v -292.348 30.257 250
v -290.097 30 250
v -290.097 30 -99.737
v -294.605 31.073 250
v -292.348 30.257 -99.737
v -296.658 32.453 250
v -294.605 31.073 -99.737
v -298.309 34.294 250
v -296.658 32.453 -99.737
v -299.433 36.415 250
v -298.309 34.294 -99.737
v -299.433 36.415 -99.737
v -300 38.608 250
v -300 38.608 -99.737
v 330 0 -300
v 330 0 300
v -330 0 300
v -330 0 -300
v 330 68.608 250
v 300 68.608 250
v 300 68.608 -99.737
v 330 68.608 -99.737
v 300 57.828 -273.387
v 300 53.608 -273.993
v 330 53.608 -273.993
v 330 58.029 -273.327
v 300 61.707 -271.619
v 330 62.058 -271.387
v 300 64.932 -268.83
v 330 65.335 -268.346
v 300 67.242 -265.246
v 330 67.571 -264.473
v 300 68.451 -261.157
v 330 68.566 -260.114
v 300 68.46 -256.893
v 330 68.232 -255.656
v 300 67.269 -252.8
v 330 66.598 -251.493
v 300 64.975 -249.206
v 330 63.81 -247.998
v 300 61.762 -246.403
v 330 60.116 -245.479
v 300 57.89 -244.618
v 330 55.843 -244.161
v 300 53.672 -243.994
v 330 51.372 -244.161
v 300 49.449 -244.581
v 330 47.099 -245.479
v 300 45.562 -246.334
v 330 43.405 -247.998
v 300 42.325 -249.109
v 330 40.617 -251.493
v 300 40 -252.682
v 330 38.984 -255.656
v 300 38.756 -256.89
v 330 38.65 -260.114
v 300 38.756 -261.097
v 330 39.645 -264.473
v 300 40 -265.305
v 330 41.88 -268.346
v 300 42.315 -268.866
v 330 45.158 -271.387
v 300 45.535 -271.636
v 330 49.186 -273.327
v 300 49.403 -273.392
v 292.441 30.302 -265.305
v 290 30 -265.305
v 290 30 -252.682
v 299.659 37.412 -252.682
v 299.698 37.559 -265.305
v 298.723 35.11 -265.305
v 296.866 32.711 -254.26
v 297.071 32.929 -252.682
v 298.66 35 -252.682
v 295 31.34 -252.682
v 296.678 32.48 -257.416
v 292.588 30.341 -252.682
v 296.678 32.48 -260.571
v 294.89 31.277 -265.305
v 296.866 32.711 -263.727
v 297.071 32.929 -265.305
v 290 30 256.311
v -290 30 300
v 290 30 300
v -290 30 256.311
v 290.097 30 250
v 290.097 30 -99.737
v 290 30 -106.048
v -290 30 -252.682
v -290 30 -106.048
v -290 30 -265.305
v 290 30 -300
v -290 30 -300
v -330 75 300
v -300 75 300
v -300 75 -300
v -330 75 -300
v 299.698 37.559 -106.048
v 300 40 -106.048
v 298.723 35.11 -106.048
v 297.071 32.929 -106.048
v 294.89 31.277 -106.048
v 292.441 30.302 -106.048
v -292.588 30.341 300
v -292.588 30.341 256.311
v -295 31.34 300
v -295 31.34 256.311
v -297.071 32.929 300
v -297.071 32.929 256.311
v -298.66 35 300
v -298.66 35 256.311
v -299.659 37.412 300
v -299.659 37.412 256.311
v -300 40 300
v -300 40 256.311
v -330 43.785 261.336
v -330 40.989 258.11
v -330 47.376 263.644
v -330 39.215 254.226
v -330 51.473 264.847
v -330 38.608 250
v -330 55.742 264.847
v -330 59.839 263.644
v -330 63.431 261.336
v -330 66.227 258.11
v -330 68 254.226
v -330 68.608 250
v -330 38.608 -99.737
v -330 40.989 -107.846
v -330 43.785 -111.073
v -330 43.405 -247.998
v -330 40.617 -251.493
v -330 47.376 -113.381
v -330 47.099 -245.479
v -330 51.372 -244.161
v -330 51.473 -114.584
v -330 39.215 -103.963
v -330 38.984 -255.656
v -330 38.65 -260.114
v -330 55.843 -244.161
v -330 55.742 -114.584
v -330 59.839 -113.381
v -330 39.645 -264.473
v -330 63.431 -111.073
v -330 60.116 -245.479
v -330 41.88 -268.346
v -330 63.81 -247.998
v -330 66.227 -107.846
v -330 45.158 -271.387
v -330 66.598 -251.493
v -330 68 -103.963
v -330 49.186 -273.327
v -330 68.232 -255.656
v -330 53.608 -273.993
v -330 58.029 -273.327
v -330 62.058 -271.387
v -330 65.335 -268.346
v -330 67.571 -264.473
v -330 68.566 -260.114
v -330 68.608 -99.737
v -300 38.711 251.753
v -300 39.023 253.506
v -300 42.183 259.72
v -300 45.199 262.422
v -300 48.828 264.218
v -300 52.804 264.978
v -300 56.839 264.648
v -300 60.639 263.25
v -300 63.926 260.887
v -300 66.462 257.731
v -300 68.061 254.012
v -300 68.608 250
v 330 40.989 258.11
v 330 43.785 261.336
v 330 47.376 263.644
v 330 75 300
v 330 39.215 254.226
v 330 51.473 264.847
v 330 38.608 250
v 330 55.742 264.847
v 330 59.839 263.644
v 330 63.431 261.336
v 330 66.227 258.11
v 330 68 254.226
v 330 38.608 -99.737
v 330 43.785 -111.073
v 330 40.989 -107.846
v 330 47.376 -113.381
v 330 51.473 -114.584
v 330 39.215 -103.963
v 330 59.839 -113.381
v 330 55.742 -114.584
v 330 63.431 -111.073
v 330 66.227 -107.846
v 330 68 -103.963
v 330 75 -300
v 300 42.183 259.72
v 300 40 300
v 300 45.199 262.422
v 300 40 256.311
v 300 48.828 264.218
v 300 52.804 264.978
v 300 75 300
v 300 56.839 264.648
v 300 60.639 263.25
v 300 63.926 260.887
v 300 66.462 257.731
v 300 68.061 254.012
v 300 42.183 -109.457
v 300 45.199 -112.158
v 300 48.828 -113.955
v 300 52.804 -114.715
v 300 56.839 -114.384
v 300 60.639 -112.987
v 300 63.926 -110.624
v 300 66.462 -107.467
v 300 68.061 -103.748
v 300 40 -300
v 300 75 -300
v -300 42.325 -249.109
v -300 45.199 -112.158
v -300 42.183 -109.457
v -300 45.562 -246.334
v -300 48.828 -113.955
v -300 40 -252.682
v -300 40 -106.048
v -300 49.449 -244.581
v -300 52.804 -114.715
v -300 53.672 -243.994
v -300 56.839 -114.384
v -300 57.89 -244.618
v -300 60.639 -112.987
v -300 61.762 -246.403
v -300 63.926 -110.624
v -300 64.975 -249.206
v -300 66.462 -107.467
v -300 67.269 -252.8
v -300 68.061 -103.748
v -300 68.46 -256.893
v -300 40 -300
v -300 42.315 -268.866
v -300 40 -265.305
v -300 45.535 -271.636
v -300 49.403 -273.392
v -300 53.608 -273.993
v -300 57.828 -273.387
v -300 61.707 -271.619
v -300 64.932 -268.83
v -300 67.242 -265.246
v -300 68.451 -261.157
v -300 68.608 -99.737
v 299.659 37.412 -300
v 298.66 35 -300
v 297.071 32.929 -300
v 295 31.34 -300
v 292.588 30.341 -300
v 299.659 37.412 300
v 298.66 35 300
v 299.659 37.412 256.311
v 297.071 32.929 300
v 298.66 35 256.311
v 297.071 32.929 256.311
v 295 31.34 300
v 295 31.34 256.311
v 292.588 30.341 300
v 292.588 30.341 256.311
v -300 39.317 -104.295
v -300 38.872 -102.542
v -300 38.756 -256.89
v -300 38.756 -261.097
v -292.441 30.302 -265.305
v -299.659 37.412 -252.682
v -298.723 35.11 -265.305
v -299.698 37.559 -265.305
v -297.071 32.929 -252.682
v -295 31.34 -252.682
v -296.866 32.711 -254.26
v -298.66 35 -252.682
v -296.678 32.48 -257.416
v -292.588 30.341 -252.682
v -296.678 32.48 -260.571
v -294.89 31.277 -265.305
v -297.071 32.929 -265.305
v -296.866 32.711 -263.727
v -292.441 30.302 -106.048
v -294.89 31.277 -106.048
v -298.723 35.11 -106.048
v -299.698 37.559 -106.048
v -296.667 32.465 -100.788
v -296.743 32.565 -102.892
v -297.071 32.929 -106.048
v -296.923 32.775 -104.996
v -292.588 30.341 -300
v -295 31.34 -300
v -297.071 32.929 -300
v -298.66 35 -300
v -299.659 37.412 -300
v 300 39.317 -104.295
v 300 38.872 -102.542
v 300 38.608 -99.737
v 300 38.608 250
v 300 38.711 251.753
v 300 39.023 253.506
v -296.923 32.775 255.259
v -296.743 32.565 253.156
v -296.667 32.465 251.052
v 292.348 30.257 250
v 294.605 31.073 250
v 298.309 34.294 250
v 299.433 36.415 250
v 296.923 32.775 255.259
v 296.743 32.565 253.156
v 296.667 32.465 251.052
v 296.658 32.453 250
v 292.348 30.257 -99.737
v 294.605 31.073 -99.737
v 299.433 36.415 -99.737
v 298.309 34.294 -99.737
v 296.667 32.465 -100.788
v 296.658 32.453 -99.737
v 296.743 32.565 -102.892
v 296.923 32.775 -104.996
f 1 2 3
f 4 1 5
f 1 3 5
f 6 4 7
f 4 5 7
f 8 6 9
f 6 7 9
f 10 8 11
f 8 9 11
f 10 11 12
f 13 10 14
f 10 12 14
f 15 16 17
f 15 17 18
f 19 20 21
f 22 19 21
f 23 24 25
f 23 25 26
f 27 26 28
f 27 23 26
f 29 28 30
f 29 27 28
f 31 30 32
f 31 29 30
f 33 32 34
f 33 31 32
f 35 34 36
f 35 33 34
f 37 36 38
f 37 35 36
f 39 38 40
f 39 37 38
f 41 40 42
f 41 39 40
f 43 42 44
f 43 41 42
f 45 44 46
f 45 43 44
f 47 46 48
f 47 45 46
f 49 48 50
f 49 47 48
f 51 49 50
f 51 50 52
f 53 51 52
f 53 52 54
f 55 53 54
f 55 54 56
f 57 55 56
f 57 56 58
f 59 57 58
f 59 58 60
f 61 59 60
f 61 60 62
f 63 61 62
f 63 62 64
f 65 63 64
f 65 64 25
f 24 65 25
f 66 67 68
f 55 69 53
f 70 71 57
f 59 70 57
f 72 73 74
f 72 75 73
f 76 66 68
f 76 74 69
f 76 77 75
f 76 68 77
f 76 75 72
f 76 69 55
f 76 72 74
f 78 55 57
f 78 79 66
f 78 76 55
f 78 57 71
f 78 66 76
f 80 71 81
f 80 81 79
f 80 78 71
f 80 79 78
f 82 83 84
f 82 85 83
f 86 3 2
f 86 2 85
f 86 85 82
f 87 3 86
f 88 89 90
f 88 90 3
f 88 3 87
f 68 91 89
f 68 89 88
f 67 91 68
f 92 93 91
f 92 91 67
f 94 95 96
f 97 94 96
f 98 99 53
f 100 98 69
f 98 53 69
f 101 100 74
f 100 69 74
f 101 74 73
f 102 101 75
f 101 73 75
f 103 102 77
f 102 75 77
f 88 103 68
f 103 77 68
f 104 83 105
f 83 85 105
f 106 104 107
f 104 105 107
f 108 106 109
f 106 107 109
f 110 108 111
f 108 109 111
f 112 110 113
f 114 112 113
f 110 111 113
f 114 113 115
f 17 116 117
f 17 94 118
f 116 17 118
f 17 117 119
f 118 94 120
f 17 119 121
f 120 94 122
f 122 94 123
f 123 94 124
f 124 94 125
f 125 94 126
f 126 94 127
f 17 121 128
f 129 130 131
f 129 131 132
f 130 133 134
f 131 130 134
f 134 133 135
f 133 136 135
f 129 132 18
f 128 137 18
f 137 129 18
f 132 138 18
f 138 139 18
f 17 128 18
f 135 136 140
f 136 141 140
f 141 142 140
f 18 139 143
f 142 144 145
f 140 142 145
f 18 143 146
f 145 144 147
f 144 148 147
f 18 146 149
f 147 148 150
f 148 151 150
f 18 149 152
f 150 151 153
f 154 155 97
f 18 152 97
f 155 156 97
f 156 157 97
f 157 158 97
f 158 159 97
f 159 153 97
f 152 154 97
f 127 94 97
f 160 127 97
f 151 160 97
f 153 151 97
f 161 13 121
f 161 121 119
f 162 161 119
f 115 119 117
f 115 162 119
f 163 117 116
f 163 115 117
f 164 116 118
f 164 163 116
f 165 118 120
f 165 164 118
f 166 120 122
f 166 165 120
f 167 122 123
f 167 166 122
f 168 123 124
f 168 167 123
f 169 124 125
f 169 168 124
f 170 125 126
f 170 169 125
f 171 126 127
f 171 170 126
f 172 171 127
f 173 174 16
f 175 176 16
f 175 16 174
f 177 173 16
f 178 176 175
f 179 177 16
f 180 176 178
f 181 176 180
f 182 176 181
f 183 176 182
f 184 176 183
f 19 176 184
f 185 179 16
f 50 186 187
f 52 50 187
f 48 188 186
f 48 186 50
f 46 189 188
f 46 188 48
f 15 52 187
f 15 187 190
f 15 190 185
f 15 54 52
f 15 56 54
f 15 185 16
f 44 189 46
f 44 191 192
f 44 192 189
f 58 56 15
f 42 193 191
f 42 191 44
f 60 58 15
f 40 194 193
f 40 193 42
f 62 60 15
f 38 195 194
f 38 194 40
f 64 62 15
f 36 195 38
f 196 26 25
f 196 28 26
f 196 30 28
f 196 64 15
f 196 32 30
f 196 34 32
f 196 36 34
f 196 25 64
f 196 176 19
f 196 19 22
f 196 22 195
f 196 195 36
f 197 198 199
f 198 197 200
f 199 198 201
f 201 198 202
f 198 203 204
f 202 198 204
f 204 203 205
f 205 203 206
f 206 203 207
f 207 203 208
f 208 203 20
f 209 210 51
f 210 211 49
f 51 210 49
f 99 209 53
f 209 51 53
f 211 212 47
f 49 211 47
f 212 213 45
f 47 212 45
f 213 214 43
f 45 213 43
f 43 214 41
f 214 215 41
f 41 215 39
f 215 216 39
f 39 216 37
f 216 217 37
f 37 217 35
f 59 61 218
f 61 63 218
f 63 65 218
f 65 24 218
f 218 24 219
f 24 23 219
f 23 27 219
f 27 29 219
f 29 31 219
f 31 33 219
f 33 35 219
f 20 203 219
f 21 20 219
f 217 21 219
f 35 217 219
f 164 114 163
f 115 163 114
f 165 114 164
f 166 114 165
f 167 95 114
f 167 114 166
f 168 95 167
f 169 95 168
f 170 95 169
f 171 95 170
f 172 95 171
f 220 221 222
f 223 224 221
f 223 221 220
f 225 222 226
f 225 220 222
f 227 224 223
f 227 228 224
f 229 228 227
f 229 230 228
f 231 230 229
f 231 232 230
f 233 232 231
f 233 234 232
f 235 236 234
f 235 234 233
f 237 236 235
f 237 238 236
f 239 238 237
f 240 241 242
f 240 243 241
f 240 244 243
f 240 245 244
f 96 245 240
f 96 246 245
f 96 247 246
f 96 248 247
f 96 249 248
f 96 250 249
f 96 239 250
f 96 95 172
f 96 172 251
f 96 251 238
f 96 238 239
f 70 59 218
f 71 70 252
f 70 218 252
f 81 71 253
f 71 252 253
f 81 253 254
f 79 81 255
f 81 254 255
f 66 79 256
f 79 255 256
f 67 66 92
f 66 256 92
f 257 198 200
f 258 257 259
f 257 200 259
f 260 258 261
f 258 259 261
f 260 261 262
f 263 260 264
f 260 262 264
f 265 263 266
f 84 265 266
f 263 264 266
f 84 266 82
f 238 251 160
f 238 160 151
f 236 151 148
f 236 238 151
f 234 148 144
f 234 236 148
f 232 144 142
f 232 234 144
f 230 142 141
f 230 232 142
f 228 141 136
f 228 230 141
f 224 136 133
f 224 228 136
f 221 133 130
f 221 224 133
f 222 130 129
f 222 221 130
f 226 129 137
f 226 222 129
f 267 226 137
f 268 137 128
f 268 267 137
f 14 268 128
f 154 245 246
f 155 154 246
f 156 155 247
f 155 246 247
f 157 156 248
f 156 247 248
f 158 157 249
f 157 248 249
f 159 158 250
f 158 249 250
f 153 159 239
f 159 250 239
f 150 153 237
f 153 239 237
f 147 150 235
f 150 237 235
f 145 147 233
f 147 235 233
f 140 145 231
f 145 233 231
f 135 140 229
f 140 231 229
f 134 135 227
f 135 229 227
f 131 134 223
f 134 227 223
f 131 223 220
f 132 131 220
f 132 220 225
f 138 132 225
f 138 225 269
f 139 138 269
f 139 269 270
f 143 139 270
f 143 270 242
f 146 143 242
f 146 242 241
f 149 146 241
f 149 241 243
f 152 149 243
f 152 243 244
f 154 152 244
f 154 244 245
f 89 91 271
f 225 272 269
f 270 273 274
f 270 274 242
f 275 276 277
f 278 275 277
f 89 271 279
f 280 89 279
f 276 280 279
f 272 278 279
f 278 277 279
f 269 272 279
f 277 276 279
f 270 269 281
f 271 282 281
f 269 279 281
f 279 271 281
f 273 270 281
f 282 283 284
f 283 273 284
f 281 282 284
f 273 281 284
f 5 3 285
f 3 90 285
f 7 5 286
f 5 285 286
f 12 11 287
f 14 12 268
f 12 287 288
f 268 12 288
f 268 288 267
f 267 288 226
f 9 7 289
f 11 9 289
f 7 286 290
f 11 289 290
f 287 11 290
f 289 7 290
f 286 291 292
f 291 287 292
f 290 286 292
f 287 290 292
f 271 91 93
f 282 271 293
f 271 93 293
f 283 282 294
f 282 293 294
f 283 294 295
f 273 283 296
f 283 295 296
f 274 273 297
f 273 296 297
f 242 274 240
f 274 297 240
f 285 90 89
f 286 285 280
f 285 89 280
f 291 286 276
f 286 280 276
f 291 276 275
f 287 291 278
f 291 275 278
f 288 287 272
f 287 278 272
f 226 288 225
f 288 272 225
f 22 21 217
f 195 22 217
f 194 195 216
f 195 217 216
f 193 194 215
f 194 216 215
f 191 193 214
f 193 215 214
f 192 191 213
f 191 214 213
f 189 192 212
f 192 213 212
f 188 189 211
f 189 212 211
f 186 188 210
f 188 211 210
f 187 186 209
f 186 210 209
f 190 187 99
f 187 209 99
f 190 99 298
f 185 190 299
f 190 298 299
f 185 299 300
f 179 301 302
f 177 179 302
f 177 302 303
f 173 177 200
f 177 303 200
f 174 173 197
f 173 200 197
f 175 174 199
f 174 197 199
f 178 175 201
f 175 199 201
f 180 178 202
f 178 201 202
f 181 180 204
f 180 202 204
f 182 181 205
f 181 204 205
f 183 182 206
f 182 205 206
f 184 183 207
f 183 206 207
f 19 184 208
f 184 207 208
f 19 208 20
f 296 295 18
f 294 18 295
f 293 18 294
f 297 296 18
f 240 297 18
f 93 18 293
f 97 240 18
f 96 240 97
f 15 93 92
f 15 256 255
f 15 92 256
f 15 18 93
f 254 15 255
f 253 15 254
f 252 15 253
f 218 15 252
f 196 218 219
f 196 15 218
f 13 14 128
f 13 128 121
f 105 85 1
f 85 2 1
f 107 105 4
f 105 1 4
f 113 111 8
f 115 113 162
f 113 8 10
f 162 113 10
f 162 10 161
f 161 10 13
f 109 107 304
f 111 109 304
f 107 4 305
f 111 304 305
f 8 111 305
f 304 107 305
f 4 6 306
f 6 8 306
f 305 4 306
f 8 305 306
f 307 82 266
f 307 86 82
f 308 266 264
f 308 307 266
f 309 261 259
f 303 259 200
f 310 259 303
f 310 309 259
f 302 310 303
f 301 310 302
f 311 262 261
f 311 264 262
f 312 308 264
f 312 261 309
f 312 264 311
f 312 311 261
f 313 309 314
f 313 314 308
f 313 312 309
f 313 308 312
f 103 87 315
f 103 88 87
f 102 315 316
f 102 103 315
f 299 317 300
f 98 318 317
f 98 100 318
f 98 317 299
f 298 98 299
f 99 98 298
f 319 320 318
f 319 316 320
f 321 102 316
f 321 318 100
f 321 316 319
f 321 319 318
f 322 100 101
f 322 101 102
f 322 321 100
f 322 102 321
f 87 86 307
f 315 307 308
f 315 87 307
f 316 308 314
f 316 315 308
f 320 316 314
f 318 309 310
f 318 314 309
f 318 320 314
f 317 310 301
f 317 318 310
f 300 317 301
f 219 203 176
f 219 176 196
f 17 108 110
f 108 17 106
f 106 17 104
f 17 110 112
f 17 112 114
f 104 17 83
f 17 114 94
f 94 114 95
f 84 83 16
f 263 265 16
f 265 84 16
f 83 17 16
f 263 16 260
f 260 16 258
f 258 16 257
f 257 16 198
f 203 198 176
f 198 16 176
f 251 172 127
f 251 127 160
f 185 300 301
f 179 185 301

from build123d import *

# Parameters (mm, degrees)
SKETCH1_W           = 600
SKETCH1_H           = 600
BOSS_EXTRUDE1_DEPTH = 30
SKETCH2_W           = 600
SKETCH2_H           = 75
SKETCH2_R           = 15
BOSS_EXTRUDE2_DEPTH = 30
CUT_EXTRUDE4_START  = -631
CUT_EXTRUDE4_DEPTH  = 661
FILLET1_R           = 10


with BuildPart() as part:
    # Sketch1 → Boss-Extrude1 (new body)
    with BuildSketch(Plane(origin=(0, 0, 0), x_dir=(1, 0, 0), z_dir=(0, 1, 0))):
        Rectangle(SKETCH1_W, SKETCH1_H)
    extrude(amount=BOSS_EXTRUDE1_DEPTH)

    # Sketch2 → Boss-Extrude2 (add)
    with BuildSketch(Plane(origin=(300, 0, 0), x_dir=(0, 0, -1), z_dir=(1, 0, 0))):
        with Locations((0, 37.5)):
            Rectangle(SKETCH2_W, SKETCH2_H)
        with Locations((258.993384408, 53.607709477)):
            Circle(SKETCH2_R, mode=Mode.SUBTRACT)
    boss_extrude2 = extrude(amount=BOSS_EXTRUDE2_DEPTH)

    # Sketch3 → Cut-Extrude4 (cut)
    with BuildSketch(Plane(origin=(330, 0, 0), x_dir=(0, 0, -1), z_dir=(1, 0, 0)).offset(CUT_EXTRUDE4_START)):
        with BuildLine():
            Line((-250, 68.607709477), (99.736599438, 68.607709477))
            ThreePointArc((99.736599438, 68.607709477), (114.736599438, 53.607709477), (99.736599438, 38.607709477))
            Line((99.736599438, 38.607709477), (-250, 38.607709477))
            ThreePointArc((-250, 38.607709477), (-265, 53.607709477), (-250, 68.607709477))
        make_face()
    cut_extrude4 = extrude(amount=CUT_EXTRUDE4_DEPTH, mode=Mode.SUBTRACT)

    # Mirror1: Boss-Extrude2, Cut-Extrude4 across plane
    add(boss_extrude2.mirror(Plane(origin=(0, 0, 0), x_dir=(0, 0, 1), z_dir=(1, 0, 0))))
    add(cut_extrude4.mirror(Plane(origin=(0, 0, 0), x_dir=(0, 0, 1), z_dir=(1, 0, 0))), mode=Mode.SUBTRACT)

    # Fillet1
    fillet1_edges = [part.edges().sort_by_distance(p)[0] for p in [
        (300, 30, 0),
        (-300, 30, 0),
    ]]
    fillet(fillet1_edges, radius=FILLET1_R)


solid = part.part
